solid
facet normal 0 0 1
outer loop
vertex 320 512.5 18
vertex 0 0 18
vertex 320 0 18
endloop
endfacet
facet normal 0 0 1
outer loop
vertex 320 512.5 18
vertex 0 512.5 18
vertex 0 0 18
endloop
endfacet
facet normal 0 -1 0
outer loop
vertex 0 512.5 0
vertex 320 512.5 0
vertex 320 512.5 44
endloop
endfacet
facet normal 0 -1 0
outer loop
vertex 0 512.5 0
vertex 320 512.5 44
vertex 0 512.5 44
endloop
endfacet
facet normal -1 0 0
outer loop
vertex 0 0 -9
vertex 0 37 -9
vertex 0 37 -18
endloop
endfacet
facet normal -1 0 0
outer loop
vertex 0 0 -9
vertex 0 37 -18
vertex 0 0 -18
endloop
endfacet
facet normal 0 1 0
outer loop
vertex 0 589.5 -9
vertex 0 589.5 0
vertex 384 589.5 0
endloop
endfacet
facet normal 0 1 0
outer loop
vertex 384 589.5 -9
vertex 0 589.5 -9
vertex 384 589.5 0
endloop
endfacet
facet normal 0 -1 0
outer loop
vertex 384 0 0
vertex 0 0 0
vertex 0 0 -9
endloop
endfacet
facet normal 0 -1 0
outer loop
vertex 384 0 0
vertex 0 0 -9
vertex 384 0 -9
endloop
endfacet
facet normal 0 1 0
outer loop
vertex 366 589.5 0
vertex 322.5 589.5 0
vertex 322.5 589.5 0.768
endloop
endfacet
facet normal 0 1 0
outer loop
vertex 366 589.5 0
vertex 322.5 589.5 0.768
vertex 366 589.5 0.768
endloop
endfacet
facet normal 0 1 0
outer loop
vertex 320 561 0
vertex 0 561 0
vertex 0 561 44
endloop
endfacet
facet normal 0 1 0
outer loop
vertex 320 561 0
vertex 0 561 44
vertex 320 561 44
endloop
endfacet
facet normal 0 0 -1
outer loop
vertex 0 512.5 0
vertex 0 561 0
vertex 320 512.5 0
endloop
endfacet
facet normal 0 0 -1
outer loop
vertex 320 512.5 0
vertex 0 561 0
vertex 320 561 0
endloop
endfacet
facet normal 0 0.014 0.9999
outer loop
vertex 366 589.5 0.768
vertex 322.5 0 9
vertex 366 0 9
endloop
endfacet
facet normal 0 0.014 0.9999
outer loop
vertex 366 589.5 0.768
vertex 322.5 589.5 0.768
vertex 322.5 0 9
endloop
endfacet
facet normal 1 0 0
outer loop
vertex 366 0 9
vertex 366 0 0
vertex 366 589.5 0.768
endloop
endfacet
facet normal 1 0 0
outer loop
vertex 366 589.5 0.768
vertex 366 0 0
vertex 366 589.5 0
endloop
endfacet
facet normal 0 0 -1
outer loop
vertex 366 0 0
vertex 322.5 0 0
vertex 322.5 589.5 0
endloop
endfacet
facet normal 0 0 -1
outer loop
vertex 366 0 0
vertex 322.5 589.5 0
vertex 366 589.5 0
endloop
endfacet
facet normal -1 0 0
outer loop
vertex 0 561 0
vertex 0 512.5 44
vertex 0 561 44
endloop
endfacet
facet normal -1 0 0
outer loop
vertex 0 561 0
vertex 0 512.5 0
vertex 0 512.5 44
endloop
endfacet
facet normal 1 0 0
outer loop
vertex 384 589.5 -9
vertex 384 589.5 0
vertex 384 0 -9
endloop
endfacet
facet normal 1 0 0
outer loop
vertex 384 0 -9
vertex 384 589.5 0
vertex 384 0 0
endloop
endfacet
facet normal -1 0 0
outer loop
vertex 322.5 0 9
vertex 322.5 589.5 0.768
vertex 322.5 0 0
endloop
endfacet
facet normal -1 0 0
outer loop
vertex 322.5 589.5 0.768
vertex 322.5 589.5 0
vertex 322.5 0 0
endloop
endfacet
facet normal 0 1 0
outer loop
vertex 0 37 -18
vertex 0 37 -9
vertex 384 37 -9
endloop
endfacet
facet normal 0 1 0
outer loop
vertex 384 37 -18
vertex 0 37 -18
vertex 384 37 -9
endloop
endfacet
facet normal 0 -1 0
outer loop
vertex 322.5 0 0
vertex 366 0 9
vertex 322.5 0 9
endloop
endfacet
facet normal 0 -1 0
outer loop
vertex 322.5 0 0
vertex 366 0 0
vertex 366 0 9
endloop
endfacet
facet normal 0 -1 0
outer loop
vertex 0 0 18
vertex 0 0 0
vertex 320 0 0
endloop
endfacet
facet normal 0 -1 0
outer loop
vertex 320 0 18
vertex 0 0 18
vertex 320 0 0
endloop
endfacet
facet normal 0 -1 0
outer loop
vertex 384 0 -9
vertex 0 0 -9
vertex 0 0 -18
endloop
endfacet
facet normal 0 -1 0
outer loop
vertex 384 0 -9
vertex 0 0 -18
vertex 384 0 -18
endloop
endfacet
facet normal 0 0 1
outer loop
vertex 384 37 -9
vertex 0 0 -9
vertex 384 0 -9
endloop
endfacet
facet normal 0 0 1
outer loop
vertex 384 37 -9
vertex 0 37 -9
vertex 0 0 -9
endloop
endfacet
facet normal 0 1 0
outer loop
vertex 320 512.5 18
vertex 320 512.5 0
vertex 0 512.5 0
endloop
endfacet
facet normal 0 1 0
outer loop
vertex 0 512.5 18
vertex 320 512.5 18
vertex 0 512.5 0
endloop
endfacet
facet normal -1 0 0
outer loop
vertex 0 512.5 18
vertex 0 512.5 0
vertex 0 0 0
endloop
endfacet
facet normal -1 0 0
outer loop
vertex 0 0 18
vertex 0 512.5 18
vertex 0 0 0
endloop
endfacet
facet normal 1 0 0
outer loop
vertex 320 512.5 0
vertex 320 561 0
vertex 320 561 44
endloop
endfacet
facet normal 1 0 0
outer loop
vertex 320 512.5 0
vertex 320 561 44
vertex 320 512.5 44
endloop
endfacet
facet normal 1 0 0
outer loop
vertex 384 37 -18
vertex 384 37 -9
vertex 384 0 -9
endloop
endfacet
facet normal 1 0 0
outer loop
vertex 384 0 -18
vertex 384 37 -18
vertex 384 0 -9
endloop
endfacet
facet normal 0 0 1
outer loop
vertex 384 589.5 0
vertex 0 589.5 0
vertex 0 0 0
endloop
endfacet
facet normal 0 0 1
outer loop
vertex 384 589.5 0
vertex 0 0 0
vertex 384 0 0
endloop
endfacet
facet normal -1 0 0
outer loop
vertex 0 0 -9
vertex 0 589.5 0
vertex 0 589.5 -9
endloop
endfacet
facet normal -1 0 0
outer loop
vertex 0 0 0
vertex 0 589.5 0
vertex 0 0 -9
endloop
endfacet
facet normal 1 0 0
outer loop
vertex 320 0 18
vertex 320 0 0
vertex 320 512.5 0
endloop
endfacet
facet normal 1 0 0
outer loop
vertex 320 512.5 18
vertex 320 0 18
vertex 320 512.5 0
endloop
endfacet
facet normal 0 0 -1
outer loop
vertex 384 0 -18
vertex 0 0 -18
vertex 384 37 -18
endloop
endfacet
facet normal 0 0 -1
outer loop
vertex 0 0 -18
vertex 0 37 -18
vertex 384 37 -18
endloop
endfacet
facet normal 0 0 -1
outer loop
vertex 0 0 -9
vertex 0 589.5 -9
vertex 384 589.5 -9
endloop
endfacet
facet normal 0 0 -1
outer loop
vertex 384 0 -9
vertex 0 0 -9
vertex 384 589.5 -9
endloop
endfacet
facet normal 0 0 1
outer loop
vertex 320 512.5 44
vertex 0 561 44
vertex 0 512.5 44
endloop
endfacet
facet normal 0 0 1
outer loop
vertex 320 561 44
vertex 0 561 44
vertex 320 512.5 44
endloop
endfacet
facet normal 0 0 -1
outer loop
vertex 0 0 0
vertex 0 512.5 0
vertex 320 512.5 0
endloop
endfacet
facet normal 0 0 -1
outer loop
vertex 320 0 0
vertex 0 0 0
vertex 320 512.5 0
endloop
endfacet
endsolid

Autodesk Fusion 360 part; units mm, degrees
sketch "Sketch1" plane through (0, 0, 0) normal (0, 0, 1) x (1, 0, 0)
  line L0 (0, 0) -> (320, 0)
  line L1 (320, 0) -> (320, 512.5)
  line L2 (320, 512.5) -> (0, 512.5)
  line L3 (0, 512.5) -> (0, 0)
  line L4 (0, 512.5) -> (0, 589.5)
  line L5 (0, 589.5) -> (384, 589.5)
  line L6 (384, 589.5) -> (384, 0)
  line L7 (384, 0) -> (320, 0)
  line L8 (0, 561) -> (320, 561)
  line L9 (320, 561) -> (320, 512.5)
  line L10 (322.5, 589.5) -> (322.5, 0)
  line L11 (366, 0) -> (366, 589.5)
  line L12 (0, 37) -> (384, 37)
  dimension "d1" = 512.5
  dimension "d2" = 320
  dimension "d3" = 77
  dimension "d4" = 64
  dimension "d5" = 48.5
  dimension "d6" = 43.5
  dimension "d7" = 2.5
  dimension "d18" = 37
extrude "Extrude1" add sketch "Sketch1" against normal blind 9 makes body 1
extrude "Extrude2" add sketch "Sketch1" along normal blind 18 separate body contours L0 L1 L3 L12 | L1 L2 L3 L12 makes body 2
extrude "Extrude3" add sketch "Sketch1" along normal blind 44 separate body contours L2 L4 L8 L9 makes body 3
extrude "Extrude4" add sketch "Sketch1" along normal blind 9 separate body contours L7 L10 L11 L12 | L5 L10 L11 L12 makes body 4
draft "Draft1" angle -0.8 neutral plane through (366, 0, 0) pull (0, -1, 0) 1 faces at (337, 393, 9) on bodies 4
extrude "Extrude5" add sketch "Sketch1" against normal blind 9 from surface at -9 separate body contours L0 L1 L3 L12 | L1 L7 L10 L12 | L7 L10 L11 L12 | L6 L7 L11 L12 makes body 5
